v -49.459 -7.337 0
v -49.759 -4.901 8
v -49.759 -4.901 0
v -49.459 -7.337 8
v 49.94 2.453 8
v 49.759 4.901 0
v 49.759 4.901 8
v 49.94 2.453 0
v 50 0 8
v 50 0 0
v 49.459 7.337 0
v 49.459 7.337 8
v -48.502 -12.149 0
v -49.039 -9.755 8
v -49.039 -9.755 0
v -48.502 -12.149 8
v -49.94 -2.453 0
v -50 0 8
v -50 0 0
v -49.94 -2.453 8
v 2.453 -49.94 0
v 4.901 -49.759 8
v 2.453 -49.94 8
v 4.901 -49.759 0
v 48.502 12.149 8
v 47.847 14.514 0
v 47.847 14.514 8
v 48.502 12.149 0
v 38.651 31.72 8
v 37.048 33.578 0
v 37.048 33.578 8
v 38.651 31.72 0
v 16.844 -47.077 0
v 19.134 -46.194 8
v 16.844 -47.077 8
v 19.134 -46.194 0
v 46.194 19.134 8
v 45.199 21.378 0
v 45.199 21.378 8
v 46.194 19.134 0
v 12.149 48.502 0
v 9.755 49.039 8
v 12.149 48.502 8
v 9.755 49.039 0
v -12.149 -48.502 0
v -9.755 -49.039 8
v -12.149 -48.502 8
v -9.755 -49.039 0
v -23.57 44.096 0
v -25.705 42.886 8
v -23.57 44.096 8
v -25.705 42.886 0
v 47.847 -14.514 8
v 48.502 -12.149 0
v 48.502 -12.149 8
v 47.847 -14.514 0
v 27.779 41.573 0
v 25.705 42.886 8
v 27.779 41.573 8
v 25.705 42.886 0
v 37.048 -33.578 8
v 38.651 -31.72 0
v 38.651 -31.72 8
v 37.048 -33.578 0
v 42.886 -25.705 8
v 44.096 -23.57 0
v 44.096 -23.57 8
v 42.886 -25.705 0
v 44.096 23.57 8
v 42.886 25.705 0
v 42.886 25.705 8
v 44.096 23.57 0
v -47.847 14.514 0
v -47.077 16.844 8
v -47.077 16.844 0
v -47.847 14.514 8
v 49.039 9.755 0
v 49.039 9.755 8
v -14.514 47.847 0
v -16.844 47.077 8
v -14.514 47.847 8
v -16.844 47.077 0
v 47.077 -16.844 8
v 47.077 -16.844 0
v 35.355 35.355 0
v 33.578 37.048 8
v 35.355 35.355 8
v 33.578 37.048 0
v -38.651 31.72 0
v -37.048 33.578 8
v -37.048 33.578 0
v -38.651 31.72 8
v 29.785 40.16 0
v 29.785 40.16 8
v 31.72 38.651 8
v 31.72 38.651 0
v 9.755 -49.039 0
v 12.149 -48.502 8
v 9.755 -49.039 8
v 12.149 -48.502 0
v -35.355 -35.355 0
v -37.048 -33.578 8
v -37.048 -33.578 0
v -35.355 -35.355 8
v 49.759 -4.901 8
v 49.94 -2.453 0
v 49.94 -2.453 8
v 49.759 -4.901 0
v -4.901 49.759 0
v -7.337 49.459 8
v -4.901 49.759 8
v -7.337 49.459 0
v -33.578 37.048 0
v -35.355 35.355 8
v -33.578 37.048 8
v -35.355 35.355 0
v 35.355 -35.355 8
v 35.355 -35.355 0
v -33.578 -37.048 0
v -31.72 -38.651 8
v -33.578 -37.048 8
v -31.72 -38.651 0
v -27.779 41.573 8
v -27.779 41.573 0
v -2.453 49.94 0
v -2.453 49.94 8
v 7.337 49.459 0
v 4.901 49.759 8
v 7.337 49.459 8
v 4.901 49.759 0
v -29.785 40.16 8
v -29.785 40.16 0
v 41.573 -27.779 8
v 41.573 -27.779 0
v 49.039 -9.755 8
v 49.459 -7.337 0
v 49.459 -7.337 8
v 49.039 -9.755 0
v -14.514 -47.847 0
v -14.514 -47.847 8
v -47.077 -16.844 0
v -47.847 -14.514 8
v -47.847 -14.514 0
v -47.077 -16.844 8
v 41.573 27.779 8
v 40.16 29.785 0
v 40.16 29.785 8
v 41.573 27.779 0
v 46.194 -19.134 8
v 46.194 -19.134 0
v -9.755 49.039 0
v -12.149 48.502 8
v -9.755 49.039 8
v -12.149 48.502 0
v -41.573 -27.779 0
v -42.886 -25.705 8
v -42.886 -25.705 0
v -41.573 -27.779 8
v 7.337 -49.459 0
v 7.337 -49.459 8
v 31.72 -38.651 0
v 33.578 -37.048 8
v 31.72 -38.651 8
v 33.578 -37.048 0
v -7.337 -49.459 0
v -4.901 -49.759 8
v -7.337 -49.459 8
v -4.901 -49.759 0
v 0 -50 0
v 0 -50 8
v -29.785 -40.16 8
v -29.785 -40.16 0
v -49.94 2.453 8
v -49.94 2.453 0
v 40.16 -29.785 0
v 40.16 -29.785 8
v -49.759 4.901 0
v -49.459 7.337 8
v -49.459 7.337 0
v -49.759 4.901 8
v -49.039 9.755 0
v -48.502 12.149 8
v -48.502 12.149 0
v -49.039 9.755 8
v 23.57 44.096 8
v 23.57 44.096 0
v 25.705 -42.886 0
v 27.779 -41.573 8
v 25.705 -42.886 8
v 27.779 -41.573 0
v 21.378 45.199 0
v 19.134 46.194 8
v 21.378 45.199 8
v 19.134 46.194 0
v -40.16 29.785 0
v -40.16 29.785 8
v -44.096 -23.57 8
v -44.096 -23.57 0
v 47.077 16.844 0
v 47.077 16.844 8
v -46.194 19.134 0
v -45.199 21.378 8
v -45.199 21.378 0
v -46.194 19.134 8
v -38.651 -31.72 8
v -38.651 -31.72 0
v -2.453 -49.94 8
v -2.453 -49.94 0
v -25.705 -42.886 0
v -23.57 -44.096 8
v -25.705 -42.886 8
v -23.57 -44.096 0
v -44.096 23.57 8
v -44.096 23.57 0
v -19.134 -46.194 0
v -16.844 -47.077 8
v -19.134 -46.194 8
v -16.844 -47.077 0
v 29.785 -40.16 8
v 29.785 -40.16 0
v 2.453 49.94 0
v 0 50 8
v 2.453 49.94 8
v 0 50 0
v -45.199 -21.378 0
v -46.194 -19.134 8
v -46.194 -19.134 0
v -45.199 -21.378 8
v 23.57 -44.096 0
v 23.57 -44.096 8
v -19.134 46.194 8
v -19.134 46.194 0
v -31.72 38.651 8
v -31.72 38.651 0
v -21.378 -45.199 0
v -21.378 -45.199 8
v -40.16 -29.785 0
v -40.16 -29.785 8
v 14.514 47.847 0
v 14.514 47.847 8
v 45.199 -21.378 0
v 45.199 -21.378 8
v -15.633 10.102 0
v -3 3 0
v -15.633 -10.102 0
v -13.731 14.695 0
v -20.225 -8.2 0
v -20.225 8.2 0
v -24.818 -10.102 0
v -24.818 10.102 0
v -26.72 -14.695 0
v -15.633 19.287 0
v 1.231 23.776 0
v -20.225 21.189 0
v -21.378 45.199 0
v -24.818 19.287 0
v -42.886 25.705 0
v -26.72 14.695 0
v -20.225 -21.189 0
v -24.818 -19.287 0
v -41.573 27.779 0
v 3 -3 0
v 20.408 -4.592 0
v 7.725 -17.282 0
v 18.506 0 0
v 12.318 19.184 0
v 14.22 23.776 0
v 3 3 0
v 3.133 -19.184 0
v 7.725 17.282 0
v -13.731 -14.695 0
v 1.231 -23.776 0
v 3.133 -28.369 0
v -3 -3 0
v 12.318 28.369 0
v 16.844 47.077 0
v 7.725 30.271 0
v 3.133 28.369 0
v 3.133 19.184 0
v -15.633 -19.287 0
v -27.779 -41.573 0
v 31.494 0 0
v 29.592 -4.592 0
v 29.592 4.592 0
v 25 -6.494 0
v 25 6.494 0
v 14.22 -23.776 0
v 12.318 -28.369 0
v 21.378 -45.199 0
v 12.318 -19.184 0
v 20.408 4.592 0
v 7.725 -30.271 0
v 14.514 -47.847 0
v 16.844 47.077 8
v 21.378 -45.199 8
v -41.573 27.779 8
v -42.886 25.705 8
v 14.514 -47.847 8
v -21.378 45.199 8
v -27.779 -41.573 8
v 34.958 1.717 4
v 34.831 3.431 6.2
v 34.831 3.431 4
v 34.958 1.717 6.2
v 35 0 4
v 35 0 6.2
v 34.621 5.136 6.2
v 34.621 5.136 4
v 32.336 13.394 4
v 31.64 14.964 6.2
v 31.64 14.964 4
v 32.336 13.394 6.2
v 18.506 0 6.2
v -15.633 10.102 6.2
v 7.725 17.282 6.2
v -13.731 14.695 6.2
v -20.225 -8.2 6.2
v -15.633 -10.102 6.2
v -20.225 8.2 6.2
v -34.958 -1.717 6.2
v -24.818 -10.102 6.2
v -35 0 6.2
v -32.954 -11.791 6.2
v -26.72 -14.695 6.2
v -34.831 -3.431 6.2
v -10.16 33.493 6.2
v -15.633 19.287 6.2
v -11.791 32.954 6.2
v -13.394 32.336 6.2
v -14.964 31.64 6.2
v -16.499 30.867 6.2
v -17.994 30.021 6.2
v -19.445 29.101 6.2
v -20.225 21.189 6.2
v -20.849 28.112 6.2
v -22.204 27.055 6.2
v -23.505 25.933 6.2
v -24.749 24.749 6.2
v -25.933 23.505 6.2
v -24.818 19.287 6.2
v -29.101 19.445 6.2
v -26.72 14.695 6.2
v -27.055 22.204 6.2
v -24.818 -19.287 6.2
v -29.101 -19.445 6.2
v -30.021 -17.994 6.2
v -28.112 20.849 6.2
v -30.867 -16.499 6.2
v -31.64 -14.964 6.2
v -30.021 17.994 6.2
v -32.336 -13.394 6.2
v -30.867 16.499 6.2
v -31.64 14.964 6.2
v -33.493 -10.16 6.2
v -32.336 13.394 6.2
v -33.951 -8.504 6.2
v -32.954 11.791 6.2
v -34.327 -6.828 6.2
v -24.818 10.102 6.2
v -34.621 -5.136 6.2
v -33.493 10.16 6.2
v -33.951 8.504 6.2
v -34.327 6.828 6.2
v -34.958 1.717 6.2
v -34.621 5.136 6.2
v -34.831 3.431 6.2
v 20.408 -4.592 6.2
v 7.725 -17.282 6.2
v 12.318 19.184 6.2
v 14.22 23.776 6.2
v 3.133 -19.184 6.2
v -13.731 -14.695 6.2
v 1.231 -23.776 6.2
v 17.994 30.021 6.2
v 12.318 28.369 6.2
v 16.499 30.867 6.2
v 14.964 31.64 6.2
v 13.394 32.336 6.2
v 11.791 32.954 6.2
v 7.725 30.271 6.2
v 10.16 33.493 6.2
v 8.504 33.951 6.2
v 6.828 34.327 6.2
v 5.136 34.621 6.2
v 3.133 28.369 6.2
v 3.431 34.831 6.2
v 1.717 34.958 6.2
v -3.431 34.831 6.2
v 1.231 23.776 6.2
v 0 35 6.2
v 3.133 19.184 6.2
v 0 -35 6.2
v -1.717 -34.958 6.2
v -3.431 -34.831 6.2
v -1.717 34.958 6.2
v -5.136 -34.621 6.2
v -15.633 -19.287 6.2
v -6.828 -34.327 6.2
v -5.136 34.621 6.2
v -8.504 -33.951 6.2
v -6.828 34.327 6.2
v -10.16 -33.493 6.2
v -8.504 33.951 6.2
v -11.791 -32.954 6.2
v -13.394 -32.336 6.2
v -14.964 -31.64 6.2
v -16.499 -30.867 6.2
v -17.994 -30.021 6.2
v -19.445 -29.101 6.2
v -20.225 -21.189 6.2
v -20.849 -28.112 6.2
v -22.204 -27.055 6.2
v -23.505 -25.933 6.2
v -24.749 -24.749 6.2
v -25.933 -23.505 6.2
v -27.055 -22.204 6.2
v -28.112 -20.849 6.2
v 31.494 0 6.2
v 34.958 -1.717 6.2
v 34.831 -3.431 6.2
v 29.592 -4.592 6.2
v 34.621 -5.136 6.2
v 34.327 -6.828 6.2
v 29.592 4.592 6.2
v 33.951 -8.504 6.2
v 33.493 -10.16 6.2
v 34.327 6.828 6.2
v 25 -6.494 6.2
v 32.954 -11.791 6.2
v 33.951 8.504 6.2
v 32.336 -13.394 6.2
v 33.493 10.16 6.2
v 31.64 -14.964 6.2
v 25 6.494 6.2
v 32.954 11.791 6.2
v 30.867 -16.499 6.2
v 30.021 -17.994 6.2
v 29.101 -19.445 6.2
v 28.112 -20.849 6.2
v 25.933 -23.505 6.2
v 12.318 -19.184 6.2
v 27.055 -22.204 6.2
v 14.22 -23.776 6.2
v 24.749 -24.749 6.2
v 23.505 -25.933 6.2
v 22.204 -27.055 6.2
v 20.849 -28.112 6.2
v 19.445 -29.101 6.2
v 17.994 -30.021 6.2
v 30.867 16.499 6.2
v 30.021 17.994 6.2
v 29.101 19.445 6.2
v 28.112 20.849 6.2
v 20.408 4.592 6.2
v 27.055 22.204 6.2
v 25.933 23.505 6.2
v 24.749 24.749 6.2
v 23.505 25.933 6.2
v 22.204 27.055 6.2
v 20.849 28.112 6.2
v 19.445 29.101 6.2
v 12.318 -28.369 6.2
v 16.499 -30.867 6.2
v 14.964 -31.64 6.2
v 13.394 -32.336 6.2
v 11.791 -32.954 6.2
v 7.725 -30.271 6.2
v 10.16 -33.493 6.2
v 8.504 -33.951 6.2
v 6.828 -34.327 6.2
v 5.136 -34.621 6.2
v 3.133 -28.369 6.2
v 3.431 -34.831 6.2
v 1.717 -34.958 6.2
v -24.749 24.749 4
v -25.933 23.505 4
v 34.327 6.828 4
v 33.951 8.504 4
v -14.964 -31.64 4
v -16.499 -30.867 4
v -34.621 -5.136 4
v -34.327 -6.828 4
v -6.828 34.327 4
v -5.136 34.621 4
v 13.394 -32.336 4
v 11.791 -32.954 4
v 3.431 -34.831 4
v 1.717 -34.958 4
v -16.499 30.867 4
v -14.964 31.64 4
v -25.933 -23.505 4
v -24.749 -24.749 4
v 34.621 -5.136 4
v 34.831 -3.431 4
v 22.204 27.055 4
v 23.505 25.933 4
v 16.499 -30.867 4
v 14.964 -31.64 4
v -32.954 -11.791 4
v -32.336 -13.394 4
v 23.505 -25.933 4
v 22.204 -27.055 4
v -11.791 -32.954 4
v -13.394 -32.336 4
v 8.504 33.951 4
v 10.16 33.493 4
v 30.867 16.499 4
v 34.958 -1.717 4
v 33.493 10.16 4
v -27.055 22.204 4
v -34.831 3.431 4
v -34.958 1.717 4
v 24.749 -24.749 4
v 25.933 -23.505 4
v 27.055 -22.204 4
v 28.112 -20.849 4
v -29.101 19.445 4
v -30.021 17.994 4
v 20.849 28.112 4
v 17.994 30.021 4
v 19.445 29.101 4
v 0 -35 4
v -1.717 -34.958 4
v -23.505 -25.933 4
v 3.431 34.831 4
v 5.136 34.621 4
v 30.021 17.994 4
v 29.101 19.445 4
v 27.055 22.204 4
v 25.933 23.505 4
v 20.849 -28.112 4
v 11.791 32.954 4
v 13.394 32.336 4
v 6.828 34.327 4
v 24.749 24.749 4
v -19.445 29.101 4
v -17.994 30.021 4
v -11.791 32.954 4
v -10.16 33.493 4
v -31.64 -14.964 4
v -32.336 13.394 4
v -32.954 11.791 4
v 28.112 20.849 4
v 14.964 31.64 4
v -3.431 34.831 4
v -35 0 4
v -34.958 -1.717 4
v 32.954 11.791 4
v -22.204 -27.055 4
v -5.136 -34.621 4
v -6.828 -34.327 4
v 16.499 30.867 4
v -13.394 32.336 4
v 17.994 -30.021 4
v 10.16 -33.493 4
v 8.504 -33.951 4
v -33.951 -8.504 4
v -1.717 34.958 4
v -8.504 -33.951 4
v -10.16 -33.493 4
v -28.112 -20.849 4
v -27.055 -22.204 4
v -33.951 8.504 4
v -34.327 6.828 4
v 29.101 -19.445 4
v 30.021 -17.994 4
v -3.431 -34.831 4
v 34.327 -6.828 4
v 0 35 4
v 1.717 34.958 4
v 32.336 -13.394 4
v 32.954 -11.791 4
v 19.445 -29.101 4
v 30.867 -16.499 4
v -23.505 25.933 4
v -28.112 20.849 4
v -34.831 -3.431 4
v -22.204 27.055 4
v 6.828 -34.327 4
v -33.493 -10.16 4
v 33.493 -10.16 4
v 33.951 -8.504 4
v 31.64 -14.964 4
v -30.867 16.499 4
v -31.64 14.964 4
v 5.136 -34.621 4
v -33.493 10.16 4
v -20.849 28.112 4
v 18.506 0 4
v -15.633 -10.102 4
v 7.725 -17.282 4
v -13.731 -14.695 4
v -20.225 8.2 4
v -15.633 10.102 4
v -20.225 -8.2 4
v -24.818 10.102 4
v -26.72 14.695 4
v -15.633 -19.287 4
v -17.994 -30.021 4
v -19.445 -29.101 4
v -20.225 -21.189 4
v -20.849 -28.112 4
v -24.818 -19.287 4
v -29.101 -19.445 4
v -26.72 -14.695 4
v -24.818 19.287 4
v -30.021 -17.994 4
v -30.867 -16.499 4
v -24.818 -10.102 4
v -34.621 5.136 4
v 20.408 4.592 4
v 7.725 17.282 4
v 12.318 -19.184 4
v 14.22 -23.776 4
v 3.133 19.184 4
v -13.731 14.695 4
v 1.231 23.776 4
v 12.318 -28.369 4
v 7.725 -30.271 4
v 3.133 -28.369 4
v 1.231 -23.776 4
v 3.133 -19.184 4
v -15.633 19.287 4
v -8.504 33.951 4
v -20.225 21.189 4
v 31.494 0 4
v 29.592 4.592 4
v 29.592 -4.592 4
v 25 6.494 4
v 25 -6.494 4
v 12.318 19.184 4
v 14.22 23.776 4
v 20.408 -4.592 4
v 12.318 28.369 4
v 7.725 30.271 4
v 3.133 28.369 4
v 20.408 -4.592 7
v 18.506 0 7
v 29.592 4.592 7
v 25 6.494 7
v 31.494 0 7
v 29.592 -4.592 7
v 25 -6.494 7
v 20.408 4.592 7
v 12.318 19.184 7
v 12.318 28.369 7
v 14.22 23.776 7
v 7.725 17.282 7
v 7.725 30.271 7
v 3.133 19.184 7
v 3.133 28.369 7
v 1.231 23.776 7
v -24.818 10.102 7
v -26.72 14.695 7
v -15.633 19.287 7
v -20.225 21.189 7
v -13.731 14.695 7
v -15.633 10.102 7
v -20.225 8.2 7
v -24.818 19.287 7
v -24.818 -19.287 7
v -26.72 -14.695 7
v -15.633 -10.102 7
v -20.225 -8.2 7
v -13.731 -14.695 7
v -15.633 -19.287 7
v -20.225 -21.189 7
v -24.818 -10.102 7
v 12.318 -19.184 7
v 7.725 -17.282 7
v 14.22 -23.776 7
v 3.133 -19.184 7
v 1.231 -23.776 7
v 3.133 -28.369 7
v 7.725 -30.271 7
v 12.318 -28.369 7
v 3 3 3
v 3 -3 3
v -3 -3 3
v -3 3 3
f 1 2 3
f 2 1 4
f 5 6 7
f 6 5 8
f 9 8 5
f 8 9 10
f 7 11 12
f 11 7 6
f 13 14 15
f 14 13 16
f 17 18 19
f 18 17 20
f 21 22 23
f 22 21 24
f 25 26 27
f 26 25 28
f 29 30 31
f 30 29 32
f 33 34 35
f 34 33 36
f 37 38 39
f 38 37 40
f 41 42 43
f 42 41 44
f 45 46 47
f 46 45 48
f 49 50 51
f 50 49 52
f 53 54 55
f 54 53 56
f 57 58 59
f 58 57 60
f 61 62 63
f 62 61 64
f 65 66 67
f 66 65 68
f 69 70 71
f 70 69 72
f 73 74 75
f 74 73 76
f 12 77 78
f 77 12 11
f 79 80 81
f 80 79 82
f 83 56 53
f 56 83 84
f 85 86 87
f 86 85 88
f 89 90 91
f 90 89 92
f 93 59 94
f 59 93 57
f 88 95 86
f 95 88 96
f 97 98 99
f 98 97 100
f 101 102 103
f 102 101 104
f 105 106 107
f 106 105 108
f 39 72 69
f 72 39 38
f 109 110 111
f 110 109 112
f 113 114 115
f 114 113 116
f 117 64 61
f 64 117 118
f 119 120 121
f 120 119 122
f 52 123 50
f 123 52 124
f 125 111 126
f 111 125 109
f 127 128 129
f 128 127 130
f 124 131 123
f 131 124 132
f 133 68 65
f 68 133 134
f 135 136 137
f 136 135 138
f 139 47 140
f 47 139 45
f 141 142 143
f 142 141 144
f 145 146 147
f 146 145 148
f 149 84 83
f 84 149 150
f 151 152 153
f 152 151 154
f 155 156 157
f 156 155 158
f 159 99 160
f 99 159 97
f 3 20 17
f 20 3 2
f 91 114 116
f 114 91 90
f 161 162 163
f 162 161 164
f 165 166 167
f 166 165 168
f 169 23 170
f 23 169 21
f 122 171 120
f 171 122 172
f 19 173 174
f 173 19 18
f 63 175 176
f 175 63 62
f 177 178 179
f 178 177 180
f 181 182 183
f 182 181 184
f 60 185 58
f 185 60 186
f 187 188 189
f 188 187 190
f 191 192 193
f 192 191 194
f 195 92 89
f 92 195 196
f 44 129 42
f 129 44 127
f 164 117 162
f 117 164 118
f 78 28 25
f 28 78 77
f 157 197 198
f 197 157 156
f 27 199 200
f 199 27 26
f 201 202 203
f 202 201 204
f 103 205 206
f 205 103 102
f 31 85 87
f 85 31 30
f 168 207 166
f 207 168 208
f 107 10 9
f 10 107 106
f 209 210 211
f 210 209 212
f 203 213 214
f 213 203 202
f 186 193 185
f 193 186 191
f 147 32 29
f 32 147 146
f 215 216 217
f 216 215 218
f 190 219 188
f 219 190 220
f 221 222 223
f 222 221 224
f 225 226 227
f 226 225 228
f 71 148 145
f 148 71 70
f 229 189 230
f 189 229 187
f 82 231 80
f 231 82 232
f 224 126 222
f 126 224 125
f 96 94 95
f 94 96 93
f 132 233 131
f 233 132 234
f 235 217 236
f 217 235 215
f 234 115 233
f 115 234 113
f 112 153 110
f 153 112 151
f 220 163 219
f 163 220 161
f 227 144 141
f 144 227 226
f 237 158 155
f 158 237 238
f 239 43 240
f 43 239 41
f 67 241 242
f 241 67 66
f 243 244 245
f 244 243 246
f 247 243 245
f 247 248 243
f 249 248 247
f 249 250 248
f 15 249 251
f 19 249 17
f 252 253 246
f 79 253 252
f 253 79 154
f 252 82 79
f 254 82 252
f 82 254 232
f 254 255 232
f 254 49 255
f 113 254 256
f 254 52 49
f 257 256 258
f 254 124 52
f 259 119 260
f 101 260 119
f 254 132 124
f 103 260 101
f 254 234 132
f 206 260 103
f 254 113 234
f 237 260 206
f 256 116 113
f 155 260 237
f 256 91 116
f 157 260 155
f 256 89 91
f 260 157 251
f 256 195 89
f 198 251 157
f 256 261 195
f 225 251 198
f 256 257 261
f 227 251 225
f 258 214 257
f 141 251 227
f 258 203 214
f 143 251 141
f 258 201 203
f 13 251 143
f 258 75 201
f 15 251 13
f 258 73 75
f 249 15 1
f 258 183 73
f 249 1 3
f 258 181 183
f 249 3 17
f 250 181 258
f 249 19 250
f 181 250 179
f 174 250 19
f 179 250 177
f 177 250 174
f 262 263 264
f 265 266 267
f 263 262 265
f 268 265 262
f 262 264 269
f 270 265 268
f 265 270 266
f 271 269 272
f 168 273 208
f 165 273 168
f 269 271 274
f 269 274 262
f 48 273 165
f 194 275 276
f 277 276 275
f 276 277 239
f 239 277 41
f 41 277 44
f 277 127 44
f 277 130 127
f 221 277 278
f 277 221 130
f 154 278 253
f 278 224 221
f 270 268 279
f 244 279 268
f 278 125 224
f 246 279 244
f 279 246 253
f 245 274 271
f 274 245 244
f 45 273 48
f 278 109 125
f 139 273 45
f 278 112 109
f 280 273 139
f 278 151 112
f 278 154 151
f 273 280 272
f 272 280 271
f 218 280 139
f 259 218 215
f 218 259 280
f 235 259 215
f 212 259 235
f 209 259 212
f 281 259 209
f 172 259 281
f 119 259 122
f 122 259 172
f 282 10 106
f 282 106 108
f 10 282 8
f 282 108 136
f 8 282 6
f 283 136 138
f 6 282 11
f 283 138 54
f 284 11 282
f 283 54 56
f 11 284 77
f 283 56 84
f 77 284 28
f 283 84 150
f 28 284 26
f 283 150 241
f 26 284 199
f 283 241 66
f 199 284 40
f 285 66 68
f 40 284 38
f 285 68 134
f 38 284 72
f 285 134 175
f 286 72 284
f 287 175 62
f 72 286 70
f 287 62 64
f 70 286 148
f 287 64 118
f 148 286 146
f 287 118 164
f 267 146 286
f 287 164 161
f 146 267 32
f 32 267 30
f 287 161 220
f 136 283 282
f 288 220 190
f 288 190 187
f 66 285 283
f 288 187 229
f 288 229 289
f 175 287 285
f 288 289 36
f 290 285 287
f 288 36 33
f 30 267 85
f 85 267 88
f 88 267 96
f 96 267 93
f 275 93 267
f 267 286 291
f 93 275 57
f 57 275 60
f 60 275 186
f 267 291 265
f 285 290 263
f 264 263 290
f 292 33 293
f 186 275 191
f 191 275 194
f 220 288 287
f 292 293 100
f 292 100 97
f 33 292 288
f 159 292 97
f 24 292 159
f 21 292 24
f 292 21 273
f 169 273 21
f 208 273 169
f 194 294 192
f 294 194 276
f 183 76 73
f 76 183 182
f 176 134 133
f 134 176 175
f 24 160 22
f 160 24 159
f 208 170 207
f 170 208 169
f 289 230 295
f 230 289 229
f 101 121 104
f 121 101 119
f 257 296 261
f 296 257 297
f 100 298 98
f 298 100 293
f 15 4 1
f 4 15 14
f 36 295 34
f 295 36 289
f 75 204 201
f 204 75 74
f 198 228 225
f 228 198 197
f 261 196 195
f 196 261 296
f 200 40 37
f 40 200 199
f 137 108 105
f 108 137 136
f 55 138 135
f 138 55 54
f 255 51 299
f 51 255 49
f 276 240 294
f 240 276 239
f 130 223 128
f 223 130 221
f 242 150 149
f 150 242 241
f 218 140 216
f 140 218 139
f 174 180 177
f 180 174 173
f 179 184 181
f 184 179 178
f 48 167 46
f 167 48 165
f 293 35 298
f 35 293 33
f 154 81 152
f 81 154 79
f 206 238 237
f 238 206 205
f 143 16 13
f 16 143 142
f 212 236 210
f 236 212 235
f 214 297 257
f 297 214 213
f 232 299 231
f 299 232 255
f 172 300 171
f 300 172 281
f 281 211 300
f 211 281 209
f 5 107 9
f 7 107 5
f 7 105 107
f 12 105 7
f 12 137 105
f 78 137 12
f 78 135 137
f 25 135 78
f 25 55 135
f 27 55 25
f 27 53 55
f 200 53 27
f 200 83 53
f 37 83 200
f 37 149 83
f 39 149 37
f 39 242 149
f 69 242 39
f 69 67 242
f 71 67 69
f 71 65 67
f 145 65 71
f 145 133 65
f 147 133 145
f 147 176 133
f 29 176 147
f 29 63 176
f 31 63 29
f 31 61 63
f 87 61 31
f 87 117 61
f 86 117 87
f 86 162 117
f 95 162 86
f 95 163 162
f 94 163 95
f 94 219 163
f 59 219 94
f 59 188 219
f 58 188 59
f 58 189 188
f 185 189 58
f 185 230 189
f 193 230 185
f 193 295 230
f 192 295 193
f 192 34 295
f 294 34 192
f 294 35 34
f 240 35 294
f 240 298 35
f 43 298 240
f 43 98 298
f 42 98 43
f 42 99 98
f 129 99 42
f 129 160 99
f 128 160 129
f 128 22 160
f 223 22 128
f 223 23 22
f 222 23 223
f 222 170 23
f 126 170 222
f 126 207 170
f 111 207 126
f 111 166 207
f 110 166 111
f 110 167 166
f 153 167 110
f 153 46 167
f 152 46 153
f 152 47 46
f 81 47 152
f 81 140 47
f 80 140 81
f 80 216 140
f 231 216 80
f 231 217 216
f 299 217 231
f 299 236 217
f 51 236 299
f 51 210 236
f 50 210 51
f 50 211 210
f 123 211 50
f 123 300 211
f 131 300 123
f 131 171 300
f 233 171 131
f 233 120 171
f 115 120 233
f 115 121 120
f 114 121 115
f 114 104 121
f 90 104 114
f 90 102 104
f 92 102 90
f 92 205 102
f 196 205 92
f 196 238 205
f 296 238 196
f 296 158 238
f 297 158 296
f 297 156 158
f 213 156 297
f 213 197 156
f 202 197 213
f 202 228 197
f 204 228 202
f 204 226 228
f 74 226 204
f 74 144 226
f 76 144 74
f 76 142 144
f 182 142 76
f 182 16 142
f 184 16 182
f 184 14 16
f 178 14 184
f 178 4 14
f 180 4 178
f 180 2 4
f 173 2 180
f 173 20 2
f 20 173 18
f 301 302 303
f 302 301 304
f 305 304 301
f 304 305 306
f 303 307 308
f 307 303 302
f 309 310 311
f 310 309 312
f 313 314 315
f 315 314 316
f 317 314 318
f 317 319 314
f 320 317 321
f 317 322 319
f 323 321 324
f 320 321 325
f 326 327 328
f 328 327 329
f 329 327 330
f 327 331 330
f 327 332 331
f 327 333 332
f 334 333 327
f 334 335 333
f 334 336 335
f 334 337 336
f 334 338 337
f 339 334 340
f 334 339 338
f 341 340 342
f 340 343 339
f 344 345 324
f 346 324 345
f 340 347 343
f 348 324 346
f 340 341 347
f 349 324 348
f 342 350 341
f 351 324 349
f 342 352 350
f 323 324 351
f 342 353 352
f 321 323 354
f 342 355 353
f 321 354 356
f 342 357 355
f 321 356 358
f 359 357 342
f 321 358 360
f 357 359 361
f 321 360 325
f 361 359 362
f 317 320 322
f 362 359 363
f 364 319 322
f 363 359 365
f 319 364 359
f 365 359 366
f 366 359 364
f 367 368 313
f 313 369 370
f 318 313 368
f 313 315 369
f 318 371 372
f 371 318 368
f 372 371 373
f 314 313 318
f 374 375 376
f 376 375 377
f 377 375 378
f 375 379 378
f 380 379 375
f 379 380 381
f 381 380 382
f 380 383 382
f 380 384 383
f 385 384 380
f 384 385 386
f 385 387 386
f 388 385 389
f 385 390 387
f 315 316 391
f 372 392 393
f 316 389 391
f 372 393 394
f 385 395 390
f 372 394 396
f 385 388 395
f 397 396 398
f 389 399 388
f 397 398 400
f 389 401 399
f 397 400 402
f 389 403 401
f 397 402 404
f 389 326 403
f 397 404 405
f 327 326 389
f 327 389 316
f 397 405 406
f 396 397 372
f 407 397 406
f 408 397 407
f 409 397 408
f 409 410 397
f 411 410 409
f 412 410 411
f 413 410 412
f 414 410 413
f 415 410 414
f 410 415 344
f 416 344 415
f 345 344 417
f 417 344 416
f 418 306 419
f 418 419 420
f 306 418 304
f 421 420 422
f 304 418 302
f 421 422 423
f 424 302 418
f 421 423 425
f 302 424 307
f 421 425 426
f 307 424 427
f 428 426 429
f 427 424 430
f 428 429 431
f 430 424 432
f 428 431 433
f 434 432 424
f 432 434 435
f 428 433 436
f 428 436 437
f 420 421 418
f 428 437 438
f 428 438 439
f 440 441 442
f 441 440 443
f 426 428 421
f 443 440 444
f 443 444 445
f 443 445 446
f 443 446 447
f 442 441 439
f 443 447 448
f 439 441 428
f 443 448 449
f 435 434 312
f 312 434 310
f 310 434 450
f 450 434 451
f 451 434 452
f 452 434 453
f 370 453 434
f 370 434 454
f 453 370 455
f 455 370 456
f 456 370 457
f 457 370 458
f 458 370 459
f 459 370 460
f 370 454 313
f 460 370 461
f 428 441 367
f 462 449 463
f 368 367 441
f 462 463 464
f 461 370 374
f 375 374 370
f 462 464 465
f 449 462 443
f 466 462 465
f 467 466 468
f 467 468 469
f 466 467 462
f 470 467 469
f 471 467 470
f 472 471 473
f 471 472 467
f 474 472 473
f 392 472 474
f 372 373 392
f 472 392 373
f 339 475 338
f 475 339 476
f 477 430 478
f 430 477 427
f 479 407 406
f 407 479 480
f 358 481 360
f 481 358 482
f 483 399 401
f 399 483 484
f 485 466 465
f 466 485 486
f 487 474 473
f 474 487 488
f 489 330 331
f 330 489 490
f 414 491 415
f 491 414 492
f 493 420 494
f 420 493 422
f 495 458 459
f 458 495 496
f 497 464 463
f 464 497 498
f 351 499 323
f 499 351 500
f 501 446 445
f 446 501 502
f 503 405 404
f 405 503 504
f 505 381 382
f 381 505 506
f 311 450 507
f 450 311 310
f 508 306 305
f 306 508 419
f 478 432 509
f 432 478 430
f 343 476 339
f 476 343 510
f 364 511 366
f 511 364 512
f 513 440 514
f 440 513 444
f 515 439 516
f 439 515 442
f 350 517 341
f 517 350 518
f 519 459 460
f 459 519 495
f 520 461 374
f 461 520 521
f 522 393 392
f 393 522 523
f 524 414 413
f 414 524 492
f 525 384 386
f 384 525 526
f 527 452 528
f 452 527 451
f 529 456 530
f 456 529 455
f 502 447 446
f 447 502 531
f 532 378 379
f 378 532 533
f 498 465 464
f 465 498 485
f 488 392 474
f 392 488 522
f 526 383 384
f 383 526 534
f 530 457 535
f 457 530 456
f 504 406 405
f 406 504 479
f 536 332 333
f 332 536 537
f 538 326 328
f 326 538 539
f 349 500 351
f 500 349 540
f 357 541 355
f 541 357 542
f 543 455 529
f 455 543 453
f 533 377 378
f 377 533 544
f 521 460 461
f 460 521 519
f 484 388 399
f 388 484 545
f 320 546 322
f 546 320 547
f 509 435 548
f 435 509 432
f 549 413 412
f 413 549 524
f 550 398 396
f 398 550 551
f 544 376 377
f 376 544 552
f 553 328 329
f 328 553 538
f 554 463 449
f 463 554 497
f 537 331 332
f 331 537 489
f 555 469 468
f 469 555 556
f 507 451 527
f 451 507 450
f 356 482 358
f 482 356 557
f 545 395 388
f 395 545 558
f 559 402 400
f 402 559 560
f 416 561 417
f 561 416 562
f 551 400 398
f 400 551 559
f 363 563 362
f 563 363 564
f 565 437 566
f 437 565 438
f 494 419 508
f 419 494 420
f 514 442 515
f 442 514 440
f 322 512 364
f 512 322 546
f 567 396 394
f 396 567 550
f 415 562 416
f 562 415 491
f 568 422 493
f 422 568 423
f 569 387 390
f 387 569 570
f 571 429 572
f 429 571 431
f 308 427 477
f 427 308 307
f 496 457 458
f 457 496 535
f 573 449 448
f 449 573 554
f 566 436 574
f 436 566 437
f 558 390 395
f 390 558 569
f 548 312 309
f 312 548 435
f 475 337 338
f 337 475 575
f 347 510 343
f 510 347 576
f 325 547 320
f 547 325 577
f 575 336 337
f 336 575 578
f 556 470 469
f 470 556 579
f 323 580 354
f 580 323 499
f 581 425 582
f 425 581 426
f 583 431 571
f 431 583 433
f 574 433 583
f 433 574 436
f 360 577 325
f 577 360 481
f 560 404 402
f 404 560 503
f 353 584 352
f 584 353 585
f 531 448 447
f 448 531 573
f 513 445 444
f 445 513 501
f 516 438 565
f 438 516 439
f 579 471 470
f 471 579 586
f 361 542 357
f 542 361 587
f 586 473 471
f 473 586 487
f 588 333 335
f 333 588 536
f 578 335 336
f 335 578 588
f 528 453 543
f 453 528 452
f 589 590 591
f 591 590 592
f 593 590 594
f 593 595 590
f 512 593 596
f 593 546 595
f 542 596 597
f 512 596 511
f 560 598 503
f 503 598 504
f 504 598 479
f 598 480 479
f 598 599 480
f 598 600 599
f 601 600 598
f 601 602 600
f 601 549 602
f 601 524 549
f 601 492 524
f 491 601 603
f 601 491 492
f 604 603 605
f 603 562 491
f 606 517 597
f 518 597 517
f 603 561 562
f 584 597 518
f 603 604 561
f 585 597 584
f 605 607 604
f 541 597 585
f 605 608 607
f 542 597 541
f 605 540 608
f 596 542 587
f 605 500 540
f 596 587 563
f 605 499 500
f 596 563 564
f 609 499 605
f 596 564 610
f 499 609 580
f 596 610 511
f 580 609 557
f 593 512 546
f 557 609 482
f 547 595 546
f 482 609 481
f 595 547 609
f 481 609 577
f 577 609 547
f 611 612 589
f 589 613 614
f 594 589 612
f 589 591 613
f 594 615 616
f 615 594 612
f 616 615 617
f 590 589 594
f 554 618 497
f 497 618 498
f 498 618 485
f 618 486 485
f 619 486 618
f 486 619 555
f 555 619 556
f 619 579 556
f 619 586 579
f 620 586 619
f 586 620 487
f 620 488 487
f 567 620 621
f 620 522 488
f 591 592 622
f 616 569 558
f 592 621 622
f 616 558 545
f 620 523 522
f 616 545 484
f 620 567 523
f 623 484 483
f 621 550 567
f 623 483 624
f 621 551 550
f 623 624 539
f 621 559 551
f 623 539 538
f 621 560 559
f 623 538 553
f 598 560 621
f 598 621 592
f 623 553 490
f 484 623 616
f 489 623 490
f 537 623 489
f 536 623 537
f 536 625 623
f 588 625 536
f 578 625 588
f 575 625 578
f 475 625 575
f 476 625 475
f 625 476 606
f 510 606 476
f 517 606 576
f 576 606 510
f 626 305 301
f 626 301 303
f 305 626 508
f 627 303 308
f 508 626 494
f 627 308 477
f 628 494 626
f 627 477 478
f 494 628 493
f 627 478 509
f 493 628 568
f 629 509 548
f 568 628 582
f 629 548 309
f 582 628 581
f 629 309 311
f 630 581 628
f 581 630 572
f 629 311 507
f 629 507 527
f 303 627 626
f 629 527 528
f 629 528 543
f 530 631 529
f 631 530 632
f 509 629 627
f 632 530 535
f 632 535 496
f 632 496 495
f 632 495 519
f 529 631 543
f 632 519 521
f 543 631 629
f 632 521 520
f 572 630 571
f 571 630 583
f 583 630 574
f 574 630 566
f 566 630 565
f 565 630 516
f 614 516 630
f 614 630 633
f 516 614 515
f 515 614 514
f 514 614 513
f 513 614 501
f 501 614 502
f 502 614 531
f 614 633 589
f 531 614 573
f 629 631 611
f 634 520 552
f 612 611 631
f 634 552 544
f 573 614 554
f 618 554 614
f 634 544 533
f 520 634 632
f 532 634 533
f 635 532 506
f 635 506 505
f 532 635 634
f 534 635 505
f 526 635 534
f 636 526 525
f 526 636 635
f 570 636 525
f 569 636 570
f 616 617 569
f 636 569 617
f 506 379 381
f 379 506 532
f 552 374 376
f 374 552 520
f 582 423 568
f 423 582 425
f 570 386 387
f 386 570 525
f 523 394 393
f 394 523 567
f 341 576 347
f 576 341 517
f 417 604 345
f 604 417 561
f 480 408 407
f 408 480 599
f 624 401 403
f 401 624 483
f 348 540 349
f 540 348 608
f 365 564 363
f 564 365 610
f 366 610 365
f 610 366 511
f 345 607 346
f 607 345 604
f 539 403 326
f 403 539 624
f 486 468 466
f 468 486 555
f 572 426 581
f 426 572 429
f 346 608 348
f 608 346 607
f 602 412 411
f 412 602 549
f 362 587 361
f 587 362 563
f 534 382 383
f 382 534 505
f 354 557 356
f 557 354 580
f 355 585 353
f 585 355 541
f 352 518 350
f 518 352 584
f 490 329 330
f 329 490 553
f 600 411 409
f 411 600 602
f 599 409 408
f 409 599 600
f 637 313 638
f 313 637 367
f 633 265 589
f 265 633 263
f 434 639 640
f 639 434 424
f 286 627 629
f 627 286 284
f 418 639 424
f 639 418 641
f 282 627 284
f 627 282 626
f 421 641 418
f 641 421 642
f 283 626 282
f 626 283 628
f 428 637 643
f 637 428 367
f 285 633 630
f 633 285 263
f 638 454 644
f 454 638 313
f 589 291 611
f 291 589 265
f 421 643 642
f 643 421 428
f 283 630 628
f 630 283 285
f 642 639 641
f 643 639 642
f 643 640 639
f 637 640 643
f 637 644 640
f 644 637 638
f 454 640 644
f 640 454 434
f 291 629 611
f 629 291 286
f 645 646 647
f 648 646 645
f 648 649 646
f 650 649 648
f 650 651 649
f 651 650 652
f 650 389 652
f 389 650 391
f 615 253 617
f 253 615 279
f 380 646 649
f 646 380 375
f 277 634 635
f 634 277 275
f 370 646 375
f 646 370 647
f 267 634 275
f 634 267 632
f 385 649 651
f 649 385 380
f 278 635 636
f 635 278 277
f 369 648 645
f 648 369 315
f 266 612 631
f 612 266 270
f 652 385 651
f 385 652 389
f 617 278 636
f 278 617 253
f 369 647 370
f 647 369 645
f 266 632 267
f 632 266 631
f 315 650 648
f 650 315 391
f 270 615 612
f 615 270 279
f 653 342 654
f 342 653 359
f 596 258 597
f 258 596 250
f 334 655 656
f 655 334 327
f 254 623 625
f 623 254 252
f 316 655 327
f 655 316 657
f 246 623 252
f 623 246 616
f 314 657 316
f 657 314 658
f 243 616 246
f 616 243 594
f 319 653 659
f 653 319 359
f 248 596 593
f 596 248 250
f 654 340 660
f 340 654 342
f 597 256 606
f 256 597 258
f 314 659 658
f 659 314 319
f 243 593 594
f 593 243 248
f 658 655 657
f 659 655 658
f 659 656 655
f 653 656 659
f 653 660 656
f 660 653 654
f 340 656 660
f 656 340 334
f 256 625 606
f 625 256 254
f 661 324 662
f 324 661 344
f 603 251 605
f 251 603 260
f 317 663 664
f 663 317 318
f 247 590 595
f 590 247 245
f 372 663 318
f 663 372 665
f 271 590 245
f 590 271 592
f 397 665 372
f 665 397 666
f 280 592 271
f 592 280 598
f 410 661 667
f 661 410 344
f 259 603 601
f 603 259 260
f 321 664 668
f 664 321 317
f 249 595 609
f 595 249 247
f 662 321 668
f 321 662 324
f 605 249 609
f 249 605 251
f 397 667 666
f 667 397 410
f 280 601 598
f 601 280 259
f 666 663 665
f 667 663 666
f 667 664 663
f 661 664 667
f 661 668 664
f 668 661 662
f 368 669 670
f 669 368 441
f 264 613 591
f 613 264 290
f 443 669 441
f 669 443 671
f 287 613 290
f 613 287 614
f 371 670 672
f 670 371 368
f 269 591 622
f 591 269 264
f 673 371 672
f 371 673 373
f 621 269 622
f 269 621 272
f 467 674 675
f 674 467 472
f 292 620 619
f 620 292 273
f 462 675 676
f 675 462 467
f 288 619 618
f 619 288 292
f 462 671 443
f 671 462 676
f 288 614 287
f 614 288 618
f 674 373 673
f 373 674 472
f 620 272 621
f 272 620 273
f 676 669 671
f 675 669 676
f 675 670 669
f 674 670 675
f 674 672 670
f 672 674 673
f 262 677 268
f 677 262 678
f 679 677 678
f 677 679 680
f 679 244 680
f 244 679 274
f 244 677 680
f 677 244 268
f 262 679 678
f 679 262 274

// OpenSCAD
$fn=128;

plate_od = 100;
thickness = 6;

rim_od = 100;
rim_id = 70;
rim_extra = 2;

recess_depth = 2;

bolt_circle_d = 50;
hole_count = 5;

oct_flat_d = 12;
oct_h = thickness + 2;

center_square = 6;

module oct_hole(flat_d, h){
    r = flat_d/(2*cos(180/8));
    cylinder(h=h, r=r, $fn=8);
}

module bolt_pattern(){
    for(i=[0:hole_count-1]){
        ang = 360/hole_count*i;
        translate([bolt_circle_d/2*cos(ang), bolt_circle_d/2*sin(ang), 0])
            oct_hole(oct_flat_d, oct_h);
    }
}

module recessed_plate(){
    difference(){
        union(){
            cylinder(h=thickness, d=plate_od);
            translate([0,0,0]) cylinder(h=thickness+rim_extra, d=rim_od);
        }
        translate([0,0,thickness-recess_depth])
            cylinder(h=recess_depth+0.2, d=rim_id);
    }
}

difference(){
    recessed_plate();
    translate([0,0,-1]) bolt_pattern();
    translate([0,0,-1]) cube([center_square, center_square, thickness+2], center=true);
}
